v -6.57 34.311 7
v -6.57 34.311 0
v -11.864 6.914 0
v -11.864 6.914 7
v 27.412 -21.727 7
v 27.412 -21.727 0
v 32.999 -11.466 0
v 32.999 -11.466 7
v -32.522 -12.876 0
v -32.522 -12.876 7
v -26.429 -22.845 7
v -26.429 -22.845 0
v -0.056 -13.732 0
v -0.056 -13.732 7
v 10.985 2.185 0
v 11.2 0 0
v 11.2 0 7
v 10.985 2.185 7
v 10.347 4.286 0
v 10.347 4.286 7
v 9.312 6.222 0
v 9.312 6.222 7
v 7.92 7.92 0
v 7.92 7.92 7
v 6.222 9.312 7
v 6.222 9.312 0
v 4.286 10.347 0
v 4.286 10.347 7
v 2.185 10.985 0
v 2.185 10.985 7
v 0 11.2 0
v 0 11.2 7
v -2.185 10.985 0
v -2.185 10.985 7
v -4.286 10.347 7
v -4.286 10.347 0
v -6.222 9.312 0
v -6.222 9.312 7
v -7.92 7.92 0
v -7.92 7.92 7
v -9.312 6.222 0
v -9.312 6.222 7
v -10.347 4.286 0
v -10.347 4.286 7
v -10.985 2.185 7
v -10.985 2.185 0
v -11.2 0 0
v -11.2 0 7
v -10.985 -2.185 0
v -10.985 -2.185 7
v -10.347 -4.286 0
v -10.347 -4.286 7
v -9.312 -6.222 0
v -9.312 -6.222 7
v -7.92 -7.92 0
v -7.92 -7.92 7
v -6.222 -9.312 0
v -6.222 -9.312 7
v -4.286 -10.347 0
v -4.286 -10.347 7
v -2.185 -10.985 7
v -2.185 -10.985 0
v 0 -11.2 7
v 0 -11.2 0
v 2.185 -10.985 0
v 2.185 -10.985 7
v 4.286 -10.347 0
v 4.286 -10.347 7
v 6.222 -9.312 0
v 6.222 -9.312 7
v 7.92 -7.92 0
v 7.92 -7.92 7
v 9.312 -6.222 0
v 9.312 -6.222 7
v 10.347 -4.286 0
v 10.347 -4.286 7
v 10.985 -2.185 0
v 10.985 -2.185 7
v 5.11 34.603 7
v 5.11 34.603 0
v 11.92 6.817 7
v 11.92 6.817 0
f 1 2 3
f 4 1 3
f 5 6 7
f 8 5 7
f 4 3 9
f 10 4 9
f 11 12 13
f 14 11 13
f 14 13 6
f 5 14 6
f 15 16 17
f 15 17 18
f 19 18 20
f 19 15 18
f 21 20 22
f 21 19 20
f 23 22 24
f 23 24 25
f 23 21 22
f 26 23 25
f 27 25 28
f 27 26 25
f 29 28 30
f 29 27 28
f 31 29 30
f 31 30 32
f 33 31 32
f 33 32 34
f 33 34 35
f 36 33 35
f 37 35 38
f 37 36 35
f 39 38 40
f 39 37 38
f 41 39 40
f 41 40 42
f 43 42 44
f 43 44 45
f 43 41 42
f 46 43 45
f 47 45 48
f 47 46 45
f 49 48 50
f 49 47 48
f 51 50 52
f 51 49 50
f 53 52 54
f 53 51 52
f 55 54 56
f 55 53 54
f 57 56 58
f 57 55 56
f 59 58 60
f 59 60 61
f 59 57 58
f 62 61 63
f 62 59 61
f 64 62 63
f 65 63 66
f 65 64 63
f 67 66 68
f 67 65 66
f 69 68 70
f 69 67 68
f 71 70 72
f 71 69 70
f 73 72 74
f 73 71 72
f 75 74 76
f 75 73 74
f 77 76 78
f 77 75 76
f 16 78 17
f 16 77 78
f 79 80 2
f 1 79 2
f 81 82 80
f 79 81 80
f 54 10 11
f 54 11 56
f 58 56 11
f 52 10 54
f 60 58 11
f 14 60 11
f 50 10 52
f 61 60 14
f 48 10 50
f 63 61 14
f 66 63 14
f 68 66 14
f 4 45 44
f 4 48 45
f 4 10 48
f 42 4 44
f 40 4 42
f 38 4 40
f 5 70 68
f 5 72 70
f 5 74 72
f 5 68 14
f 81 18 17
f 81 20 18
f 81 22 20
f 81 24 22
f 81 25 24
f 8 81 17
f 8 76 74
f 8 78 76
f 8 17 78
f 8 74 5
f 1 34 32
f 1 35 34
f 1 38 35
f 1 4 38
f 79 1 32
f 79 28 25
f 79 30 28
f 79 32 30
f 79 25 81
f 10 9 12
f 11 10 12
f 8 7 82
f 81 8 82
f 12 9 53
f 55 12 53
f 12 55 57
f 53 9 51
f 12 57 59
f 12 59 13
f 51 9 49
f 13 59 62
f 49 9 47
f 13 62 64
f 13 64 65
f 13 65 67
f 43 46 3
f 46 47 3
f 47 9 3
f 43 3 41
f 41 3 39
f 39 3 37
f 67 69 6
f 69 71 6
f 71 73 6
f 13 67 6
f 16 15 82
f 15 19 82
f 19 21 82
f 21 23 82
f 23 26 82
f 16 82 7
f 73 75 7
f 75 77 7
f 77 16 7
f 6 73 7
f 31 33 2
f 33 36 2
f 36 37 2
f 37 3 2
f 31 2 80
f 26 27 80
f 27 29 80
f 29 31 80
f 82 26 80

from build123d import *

# Parameters (mm, degrees)
F0_R     = 11.2
F1_DEPTH = 7


with BuildPart() as f1:
    # F0 (on Top) → F1 (new body)
    with BuildSketch(Plane.XY):
        Polygon((11.919819, 6.817446), (5.110128, 34.602866), (-6.570164, 34.310859), (-11.86399, 6.914143), (-32.522025, -12.875932), (-26.428993, -22.845358), (-0.055828, -13.731589), (27.411896, -21.726934), (32.999157, -11.465501), align=None)
        Circle(F0_R, mode=Mode.SUBTRACT)
    extrude(amount=F1_DEPTH)


solid = f1.part
